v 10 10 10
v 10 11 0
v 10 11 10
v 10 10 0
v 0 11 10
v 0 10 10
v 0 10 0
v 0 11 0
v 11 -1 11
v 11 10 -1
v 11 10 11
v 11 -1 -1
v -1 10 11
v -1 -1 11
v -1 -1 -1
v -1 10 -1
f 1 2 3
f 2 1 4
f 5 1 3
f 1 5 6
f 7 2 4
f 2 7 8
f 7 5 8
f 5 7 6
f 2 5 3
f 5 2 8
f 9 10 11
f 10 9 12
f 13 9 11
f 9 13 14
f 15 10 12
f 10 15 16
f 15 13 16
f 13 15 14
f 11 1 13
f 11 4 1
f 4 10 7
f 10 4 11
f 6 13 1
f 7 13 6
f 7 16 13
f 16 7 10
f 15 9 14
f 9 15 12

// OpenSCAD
// Unit of length: Unit.MM
union()
{
   color(c = [1.0, 0.0, 0.0, 1.0])
   {
      cube(size = [10.0, 11.0, 10.0], center = false);
   }
   translate(v = [-1.0, -1.0, -1.0])
   {
      cube(size = [12.0, 11.0, 12.0], center = false);
   }
}
